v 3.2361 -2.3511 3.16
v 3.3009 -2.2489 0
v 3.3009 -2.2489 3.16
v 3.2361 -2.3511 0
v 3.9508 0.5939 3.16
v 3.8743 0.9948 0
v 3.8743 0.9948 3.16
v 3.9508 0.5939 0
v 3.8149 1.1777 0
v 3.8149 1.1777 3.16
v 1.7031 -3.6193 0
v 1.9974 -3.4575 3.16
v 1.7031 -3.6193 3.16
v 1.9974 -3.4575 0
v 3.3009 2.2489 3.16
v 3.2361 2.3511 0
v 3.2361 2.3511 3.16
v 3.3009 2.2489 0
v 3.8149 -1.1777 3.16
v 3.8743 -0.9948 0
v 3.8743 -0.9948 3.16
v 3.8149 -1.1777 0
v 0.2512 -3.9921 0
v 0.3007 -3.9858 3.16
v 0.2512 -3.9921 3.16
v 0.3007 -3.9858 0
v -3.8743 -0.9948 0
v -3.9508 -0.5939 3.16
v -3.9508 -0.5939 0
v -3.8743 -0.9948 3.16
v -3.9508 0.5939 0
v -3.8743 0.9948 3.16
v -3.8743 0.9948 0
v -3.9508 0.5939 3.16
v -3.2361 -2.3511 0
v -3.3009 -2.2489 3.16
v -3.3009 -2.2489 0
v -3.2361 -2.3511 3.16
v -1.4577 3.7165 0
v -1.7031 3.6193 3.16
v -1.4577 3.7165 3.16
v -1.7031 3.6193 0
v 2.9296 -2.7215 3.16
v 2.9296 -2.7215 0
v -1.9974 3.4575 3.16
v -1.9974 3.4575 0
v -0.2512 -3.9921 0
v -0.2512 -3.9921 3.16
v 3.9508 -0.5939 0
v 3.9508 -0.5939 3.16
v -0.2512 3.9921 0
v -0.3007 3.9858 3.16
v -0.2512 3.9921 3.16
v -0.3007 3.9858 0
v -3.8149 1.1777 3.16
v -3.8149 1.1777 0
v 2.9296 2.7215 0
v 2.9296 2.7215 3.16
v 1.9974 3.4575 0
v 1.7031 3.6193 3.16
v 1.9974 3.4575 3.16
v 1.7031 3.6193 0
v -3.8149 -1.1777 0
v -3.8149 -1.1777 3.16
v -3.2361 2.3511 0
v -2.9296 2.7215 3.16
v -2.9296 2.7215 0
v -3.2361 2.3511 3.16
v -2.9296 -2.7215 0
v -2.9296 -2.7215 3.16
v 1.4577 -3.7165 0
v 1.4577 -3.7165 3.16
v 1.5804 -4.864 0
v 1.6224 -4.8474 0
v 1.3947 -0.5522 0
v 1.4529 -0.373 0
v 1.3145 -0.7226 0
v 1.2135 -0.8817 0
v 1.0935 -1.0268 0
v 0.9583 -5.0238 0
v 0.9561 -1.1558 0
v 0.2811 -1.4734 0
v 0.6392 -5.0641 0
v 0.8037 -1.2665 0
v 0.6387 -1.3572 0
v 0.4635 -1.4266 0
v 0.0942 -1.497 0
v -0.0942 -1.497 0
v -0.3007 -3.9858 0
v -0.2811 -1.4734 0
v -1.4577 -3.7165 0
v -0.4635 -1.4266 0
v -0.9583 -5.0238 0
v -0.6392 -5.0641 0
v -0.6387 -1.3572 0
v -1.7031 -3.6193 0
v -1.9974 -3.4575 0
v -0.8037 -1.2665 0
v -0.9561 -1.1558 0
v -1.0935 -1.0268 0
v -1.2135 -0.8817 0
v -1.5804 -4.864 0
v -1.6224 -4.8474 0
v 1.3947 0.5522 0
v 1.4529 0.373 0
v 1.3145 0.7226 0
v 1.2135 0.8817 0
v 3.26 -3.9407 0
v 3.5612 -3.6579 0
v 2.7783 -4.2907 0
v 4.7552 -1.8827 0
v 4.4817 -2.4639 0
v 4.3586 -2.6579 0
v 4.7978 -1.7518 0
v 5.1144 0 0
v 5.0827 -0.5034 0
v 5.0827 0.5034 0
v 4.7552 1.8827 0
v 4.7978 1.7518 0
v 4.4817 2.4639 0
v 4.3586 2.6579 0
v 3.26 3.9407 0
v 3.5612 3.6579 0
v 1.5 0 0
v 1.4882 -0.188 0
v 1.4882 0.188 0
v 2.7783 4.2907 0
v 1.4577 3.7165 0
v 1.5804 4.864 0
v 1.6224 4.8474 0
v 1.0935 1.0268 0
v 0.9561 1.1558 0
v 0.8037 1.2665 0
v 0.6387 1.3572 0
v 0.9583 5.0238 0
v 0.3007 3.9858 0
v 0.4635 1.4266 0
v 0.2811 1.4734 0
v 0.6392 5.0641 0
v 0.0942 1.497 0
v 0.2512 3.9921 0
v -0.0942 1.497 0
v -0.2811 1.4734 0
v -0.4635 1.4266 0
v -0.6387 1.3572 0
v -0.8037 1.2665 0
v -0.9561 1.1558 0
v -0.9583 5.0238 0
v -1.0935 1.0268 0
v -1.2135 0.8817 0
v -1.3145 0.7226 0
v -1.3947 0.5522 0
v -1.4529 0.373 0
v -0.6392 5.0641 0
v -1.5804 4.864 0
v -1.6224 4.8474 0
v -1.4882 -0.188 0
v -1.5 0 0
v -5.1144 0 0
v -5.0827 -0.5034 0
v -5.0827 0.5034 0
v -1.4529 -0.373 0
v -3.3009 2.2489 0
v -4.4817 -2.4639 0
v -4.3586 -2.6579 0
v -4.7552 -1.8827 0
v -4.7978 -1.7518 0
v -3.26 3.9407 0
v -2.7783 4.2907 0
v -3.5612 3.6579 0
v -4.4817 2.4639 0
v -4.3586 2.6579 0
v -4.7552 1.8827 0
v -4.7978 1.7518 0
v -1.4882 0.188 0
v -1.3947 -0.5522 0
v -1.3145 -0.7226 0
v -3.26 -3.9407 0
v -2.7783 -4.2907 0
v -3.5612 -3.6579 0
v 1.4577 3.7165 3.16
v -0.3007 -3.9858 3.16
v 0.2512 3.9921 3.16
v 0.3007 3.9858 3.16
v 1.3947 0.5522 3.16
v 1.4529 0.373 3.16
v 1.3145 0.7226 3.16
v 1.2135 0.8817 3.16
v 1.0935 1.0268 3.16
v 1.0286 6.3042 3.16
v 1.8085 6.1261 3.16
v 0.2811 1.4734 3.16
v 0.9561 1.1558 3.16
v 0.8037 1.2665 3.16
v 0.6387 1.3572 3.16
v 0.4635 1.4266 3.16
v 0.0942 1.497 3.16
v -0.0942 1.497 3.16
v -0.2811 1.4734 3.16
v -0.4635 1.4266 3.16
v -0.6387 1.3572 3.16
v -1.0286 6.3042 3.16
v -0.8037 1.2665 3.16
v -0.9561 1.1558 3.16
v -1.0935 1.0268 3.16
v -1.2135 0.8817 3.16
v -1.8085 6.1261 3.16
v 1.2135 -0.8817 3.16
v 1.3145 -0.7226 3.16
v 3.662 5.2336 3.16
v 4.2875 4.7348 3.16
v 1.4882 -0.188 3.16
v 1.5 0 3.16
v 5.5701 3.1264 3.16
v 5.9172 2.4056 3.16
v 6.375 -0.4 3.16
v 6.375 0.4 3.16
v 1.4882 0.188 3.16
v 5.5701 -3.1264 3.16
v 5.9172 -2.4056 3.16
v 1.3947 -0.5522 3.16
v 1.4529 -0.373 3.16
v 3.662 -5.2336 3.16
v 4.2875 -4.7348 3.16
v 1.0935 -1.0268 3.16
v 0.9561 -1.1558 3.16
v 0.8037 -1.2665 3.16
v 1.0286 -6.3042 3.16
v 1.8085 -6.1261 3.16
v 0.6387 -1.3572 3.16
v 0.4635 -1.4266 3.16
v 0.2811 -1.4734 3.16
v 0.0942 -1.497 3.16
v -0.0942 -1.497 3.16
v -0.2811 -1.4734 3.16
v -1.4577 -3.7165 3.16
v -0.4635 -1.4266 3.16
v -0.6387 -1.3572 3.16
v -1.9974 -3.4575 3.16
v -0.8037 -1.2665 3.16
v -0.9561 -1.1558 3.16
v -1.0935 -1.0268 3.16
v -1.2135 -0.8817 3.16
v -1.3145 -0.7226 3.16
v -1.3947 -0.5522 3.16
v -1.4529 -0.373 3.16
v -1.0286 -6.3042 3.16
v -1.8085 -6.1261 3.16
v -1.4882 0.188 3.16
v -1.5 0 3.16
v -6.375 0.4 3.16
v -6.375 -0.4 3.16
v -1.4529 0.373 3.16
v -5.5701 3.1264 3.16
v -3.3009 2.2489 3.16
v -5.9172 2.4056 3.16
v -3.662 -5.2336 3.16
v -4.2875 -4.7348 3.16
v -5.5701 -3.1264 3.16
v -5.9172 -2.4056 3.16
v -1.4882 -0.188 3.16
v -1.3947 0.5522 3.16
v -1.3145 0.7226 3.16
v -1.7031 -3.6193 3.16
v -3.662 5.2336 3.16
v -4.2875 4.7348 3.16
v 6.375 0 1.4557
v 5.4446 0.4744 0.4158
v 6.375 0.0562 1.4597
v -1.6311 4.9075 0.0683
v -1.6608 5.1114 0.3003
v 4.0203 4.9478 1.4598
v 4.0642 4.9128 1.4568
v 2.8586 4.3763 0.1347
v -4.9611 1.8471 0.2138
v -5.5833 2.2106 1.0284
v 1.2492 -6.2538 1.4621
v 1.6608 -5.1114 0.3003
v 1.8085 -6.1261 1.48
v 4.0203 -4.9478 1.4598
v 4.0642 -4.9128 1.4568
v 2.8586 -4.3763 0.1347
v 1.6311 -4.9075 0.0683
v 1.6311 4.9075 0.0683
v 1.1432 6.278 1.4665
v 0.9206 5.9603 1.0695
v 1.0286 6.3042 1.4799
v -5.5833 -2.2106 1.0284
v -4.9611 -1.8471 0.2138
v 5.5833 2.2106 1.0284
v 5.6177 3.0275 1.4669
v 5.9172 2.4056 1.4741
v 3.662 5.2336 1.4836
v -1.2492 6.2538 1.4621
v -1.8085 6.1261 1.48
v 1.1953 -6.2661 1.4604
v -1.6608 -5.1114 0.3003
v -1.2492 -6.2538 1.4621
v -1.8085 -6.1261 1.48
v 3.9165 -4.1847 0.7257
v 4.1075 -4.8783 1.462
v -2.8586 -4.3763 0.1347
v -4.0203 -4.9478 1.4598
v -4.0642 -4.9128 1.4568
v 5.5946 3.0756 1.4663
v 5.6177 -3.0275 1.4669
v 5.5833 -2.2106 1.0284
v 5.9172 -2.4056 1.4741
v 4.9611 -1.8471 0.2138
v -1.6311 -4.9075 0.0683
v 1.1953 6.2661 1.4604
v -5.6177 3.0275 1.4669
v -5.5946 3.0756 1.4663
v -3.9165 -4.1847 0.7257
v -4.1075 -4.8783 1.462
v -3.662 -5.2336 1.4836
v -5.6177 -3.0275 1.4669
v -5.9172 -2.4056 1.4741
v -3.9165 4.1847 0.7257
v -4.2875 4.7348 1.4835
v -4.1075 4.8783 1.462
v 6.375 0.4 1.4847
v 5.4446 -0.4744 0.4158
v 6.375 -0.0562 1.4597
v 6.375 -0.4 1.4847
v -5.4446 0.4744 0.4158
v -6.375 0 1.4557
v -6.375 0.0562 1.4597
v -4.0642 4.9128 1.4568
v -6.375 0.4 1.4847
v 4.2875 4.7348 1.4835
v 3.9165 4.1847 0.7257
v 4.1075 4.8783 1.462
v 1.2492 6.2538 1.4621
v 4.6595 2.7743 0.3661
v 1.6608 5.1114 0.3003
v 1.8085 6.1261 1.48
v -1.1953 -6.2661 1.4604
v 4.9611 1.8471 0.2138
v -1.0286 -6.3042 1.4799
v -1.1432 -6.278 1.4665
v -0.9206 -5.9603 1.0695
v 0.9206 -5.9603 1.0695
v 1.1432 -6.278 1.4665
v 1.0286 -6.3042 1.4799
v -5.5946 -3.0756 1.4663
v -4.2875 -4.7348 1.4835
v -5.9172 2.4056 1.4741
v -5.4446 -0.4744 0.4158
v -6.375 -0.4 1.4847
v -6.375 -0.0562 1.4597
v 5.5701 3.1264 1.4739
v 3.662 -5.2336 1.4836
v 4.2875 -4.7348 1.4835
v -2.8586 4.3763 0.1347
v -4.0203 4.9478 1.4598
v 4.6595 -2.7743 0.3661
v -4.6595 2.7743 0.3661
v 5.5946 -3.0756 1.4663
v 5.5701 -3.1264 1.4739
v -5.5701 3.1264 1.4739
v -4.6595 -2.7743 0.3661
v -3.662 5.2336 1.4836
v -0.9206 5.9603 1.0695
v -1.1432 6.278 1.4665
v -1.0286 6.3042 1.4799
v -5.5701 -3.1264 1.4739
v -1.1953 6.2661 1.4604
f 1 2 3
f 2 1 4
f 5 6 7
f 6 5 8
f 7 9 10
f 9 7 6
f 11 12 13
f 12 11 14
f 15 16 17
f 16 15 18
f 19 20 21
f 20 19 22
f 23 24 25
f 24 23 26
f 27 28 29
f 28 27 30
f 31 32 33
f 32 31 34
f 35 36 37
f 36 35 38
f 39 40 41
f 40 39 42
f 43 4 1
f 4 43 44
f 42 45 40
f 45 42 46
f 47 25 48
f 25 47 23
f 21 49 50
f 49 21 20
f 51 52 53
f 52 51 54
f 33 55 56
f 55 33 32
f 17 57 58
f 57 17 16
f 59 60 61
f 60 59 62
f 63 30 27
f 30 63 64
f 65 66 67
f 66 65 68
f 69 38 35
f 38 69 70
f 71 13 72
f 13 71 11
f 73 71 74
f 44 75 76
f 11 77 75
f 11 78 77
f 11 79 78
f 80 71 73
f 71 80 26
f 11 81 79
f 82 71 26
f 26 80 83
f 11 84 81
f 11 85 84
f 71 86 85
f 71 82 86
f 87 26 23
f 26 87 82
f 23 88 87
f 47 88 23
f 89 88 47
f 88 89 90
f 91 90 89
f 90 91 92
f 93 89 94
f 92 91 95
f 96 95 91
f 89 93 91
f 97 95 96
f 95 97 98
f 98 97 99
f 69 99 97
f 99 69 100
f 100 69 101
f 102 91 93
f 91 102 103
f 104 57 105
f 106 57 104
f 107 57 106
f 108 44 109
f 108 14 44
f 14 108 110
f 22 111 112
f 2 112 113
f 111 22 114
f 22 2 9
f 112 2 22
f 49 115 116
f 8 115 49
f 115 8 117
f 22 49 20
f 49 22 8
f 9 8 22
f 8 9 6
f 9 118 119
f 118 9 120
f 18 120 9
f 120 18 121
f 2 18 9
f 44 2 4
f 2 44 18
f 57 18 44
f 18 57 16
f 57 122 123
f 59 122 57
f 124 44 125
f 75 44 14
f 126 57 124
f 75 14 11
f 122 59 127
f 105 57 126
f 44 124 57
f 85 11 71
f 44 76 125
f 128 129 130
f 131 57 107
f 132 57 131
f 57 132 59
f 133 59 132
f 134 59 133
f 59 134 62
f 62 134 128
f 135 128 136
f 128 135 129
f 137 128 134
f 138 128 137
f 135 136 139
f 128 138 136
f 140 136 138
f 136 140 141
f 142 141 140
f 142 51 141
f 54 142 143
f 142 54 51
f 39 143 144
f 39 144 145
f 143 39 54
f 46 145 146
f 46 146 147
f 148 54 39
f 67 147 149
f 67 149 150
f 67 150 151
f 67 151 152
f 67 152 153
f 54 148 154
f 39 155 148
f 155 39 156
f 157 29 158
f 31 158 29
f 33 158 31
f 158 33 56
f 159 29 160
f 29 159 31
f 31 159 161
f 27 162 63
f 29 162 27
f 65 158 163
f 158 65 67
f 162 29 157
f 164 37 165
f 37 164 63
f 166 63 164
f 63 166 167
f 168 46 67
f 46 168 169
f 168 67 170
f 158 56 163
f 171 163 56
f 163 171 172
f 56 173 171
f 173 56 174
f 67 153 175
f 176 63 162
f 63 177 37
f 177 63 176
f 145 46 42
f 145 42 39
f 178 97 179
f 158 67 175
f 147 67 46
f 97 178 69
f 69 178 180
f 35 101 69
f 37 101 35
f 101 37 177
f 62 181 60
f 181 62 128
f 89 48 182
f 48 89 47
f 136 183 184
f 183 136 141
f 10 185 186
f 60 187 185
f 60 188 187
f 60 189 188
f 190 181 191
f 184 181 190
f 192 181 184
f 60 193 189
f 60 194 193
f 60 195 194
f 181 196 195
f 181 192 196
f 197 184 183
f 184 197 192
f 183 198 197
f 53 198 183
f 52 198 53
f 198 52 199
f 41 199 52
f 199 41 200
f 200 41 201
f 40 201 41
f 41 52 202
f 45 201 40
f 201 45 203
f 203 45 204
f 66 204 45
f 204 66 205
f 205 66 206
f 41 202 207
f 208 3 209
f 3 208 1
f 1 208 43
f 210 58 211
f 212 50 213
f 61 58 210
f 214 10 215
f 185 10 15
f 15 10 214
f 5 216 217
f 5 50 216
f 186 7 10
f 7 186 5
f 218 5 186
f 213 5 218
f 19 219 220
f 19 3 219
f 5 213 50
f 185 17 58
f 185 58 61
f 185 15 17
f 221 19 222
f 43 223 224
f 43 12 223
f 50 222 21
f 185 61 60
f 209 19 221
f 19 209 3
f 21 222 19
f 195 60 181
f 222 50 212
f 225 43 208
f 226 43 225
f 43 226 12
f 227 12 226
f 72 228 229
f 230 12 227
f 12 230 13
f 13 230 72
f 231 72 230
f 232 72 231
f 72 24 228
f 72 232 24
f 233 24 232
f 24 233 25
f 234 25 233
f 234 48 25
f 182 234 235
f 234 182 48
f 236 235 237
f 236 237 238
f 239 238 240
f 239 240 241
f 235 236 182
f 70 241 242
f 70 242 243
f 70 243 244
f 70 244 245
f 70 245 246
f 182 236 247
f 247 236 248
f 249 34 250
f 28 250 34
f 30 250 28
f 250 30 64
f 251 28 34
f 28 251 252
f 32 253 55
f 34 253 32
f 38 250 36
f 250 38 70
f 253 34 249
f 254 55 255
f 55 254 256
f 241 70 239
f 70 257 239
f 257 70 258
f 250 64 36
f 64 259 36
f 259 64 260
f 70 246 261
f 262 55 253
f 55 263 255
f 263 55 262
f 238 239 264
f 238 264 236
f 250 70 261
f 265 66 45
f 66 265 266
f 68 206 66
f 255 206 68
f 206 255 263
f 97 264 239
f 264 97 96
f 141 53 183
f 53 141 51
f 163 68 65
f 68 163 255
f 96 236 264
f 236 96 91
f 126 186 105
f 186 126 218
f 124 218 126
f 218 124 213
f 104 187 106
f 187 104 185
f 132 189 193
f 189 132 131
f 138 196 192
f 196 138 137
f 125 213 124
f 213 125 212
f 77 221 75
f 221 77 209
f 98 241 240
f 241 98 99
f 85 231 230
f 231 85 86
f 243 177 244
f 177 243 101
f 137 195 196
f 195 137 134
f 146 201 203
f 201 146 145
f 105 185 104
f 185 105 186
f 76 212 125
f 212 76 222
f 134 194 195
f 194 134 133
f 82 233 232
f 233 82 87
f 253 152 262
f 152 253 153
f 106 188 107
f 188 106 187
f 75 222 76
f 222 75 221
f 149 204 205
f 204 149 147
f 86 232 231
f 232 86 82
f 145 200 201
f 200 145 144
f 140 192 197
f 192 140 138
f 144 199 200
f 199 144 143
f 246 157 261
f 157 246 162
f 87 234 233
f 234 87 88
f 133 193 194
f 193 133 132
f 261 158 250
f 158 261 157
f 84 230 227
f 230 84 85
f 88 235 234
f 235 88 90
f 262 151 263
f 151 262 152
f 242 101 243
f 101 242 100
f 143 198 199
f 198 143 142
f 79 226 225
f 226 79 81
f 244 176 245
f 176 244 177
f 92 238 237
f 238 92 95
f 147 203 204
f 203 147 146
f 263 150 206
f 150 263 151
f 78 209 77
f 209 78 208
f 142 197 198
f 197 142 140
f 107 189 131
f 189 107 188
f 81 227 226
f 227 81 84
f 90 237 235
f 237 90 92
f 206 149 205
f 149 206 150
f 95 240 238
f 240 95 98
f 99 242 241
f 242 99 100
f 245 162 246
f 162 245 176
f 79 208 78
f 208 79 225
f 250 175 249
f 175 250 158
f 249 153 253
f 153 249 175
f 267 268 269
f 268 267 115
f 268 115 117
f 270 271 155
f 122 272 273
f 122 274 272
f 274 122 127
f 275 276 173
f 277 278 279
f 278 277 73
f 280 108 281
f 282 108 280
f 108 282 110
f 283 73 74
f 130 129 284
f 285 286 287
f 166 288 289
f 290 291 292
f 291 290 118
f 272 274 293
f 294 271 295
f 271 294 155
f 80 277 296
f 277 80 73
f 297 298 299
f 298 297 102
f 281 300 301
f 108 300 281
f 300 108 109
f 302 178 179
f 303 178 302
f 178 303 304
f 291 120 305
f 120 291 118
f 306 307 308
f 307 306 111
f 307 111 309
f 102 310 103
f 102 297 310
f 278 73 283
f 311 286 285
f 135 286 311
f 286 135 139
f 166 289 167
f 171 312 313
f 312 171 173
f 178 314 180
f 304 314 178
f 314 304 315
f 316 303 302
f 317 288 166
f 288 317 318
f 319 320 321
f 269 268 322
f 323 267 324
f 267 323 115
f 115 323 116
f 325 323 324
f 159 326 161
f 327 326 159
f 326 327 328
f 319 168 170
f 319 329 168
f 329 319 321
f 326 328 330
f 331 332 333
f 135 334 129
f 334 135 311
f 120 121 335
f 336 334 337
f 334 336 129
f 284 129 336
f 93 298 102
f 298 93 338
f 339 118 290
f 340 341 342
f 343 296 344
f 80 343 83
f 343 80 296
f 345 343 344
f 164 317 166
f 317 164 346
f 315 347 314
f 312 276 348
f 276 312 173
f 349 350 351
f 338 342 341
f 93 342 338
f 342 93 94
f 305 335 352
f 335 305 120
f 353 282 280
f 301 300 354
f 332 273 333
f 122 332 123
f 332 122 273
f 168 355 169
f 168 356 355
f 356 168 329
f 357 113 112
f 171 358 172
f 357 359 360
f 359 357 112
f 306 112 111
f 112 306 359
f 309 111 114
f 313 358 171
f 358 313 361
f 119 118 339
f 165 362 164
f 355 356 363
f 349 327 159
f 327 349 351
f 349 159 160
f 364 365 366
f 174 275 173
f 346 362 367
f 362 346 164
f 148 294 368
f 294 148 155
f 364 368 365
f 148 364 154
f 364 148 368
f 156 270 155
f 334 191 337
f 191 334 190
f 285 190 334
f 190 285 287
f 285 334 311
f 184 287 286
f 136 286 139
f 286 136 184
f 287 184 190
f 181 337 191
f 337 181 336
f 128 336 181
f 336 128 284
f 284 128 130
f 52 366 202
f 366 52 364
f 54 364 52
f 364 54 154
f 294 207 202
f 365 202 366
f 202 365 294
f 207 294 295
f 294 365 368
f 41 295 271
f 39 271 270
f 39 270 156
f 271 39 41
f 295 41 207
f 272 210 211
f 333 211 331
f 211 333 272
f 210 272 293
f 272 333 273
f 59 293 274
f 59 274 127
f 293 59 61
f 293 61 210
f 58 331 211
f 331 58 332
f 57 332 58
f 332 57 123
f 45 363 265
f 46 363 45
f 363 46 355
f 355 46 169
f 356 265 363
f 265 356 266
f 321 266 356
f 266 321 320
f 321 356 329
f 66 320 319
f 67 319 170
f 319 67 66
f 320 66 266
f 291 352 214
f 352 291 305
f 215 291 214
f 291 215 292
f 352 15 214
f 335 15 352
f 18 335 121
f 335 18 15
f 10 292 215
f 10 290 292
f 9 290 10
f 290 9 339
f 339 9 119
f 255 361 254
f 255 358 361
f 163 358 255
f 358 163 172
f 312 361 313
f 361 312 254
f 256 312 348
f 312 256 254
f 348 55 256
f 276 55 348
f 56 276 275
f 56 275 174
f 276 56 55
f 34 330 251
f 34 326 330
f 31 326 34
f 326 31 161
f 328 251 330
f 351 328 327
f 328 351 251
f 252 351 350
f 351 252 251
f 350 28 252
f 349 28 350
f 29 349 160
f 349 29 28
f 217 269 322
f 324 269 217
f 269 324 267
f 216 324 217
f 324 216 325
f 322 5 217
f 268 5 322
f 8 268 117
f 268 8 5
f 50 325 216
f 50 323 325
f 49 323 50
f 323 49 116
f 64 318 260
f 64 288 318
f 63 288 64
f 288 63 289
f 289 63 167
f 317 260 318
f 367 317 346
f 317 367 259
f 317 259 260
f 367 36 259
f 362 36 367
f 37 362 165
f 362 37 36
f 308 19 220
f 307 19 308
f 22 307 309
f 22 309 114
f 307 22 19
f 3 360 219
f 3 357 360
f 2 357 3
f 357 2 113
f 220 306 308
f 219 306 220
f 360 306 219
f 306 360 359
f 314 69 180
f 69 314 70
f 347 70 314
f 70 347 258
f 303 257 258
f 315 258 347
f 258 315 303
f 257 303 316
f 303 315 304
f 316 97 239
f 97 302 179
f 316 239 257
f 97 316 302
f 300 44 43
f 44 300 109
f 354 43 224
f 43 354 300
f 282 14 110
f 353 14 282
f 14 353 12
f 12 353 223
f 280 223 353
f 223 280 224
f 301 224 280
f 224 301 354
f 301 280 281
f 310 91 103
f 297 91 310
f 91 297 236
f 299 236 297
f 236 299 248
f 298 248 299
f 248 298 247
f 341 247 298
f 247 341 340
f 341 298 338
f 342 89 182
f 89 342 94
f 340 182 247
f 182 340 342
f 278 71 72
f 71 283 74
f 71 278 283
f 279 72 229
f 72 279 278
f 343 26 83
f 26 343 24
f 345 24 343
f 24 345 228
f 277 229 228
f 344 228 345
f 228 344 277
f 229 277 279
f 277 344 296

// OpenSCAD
TOOTH_BOT_WIDTH = 1.2;
TOOTH_TOP_WIDTH = 0.8;
TOOTH_LENGTH = 2.5;

BEVEL_HEIGHT = 1.6;
BEVEL_ANGLE = 60;
Z_UNIT = 7.9;

$fn = 50;


module tooth(top_width, bot_width, length) {
    //   4 ___ 3
    //    /   \
    //   /_____\
    //  1       2
    polygon([
        [-length/2, -bot_width/2], // 1
        [-length/2, bot_width/2],  // 2
        [length/2, top_width/2],   // 3
        [length/2, -top_width/2]   // 4
    ]);
}

module teeth(n, diameter, top_width, bot_width, length, inner) {
    union() {
        for(i = [0:n]) {
            rotate([0, 0, i * 360/n])
            translate([-(diameter-length * (inner ? 0.9 : 1.1))/2, 0, 0])
            rotate([0, 0, inner ? 0 : 180])
            tooth(top_width, bot_width, length);
        }
    }
}

module bevel(diameter, height, angle) {
    difference() {
        cylinder(d = diameter, h = height);
        cylinder(d1 = diameter - 2 * sin(angle) * height, d2 = diameter, h = height);
    }
}

module gear(teeth, outer_dia, inner_dia, height) {
    h = height * Z_UNIT;
    union() {
        difference() {
            cylinder(d = outer_dia - 2 * TOOTH_LENGTH, h = h);
            cylinder(d = inner_dia, h = h);
        }
        difference() {
            linear_extrude(height = h)
            teeth(teeth, outer_dia, TOOTH_TOP_WIDTH, TOOTH_BOT_WIDTH, TOOTH_LENGTH, false);

            bevel(outer_dia, BEVEL_HEIGHT, BEVEL_ANGLE);
            
            if(height >= 1) {
                translate([0, 0, h])
                rotate([180, 0, 0])
                bevel(outer_dia, BEVEL_HEIGHT, BEVEL_ANGLE);
            }
        }
    }
}

gear(14, 13, 3, 0.4);
